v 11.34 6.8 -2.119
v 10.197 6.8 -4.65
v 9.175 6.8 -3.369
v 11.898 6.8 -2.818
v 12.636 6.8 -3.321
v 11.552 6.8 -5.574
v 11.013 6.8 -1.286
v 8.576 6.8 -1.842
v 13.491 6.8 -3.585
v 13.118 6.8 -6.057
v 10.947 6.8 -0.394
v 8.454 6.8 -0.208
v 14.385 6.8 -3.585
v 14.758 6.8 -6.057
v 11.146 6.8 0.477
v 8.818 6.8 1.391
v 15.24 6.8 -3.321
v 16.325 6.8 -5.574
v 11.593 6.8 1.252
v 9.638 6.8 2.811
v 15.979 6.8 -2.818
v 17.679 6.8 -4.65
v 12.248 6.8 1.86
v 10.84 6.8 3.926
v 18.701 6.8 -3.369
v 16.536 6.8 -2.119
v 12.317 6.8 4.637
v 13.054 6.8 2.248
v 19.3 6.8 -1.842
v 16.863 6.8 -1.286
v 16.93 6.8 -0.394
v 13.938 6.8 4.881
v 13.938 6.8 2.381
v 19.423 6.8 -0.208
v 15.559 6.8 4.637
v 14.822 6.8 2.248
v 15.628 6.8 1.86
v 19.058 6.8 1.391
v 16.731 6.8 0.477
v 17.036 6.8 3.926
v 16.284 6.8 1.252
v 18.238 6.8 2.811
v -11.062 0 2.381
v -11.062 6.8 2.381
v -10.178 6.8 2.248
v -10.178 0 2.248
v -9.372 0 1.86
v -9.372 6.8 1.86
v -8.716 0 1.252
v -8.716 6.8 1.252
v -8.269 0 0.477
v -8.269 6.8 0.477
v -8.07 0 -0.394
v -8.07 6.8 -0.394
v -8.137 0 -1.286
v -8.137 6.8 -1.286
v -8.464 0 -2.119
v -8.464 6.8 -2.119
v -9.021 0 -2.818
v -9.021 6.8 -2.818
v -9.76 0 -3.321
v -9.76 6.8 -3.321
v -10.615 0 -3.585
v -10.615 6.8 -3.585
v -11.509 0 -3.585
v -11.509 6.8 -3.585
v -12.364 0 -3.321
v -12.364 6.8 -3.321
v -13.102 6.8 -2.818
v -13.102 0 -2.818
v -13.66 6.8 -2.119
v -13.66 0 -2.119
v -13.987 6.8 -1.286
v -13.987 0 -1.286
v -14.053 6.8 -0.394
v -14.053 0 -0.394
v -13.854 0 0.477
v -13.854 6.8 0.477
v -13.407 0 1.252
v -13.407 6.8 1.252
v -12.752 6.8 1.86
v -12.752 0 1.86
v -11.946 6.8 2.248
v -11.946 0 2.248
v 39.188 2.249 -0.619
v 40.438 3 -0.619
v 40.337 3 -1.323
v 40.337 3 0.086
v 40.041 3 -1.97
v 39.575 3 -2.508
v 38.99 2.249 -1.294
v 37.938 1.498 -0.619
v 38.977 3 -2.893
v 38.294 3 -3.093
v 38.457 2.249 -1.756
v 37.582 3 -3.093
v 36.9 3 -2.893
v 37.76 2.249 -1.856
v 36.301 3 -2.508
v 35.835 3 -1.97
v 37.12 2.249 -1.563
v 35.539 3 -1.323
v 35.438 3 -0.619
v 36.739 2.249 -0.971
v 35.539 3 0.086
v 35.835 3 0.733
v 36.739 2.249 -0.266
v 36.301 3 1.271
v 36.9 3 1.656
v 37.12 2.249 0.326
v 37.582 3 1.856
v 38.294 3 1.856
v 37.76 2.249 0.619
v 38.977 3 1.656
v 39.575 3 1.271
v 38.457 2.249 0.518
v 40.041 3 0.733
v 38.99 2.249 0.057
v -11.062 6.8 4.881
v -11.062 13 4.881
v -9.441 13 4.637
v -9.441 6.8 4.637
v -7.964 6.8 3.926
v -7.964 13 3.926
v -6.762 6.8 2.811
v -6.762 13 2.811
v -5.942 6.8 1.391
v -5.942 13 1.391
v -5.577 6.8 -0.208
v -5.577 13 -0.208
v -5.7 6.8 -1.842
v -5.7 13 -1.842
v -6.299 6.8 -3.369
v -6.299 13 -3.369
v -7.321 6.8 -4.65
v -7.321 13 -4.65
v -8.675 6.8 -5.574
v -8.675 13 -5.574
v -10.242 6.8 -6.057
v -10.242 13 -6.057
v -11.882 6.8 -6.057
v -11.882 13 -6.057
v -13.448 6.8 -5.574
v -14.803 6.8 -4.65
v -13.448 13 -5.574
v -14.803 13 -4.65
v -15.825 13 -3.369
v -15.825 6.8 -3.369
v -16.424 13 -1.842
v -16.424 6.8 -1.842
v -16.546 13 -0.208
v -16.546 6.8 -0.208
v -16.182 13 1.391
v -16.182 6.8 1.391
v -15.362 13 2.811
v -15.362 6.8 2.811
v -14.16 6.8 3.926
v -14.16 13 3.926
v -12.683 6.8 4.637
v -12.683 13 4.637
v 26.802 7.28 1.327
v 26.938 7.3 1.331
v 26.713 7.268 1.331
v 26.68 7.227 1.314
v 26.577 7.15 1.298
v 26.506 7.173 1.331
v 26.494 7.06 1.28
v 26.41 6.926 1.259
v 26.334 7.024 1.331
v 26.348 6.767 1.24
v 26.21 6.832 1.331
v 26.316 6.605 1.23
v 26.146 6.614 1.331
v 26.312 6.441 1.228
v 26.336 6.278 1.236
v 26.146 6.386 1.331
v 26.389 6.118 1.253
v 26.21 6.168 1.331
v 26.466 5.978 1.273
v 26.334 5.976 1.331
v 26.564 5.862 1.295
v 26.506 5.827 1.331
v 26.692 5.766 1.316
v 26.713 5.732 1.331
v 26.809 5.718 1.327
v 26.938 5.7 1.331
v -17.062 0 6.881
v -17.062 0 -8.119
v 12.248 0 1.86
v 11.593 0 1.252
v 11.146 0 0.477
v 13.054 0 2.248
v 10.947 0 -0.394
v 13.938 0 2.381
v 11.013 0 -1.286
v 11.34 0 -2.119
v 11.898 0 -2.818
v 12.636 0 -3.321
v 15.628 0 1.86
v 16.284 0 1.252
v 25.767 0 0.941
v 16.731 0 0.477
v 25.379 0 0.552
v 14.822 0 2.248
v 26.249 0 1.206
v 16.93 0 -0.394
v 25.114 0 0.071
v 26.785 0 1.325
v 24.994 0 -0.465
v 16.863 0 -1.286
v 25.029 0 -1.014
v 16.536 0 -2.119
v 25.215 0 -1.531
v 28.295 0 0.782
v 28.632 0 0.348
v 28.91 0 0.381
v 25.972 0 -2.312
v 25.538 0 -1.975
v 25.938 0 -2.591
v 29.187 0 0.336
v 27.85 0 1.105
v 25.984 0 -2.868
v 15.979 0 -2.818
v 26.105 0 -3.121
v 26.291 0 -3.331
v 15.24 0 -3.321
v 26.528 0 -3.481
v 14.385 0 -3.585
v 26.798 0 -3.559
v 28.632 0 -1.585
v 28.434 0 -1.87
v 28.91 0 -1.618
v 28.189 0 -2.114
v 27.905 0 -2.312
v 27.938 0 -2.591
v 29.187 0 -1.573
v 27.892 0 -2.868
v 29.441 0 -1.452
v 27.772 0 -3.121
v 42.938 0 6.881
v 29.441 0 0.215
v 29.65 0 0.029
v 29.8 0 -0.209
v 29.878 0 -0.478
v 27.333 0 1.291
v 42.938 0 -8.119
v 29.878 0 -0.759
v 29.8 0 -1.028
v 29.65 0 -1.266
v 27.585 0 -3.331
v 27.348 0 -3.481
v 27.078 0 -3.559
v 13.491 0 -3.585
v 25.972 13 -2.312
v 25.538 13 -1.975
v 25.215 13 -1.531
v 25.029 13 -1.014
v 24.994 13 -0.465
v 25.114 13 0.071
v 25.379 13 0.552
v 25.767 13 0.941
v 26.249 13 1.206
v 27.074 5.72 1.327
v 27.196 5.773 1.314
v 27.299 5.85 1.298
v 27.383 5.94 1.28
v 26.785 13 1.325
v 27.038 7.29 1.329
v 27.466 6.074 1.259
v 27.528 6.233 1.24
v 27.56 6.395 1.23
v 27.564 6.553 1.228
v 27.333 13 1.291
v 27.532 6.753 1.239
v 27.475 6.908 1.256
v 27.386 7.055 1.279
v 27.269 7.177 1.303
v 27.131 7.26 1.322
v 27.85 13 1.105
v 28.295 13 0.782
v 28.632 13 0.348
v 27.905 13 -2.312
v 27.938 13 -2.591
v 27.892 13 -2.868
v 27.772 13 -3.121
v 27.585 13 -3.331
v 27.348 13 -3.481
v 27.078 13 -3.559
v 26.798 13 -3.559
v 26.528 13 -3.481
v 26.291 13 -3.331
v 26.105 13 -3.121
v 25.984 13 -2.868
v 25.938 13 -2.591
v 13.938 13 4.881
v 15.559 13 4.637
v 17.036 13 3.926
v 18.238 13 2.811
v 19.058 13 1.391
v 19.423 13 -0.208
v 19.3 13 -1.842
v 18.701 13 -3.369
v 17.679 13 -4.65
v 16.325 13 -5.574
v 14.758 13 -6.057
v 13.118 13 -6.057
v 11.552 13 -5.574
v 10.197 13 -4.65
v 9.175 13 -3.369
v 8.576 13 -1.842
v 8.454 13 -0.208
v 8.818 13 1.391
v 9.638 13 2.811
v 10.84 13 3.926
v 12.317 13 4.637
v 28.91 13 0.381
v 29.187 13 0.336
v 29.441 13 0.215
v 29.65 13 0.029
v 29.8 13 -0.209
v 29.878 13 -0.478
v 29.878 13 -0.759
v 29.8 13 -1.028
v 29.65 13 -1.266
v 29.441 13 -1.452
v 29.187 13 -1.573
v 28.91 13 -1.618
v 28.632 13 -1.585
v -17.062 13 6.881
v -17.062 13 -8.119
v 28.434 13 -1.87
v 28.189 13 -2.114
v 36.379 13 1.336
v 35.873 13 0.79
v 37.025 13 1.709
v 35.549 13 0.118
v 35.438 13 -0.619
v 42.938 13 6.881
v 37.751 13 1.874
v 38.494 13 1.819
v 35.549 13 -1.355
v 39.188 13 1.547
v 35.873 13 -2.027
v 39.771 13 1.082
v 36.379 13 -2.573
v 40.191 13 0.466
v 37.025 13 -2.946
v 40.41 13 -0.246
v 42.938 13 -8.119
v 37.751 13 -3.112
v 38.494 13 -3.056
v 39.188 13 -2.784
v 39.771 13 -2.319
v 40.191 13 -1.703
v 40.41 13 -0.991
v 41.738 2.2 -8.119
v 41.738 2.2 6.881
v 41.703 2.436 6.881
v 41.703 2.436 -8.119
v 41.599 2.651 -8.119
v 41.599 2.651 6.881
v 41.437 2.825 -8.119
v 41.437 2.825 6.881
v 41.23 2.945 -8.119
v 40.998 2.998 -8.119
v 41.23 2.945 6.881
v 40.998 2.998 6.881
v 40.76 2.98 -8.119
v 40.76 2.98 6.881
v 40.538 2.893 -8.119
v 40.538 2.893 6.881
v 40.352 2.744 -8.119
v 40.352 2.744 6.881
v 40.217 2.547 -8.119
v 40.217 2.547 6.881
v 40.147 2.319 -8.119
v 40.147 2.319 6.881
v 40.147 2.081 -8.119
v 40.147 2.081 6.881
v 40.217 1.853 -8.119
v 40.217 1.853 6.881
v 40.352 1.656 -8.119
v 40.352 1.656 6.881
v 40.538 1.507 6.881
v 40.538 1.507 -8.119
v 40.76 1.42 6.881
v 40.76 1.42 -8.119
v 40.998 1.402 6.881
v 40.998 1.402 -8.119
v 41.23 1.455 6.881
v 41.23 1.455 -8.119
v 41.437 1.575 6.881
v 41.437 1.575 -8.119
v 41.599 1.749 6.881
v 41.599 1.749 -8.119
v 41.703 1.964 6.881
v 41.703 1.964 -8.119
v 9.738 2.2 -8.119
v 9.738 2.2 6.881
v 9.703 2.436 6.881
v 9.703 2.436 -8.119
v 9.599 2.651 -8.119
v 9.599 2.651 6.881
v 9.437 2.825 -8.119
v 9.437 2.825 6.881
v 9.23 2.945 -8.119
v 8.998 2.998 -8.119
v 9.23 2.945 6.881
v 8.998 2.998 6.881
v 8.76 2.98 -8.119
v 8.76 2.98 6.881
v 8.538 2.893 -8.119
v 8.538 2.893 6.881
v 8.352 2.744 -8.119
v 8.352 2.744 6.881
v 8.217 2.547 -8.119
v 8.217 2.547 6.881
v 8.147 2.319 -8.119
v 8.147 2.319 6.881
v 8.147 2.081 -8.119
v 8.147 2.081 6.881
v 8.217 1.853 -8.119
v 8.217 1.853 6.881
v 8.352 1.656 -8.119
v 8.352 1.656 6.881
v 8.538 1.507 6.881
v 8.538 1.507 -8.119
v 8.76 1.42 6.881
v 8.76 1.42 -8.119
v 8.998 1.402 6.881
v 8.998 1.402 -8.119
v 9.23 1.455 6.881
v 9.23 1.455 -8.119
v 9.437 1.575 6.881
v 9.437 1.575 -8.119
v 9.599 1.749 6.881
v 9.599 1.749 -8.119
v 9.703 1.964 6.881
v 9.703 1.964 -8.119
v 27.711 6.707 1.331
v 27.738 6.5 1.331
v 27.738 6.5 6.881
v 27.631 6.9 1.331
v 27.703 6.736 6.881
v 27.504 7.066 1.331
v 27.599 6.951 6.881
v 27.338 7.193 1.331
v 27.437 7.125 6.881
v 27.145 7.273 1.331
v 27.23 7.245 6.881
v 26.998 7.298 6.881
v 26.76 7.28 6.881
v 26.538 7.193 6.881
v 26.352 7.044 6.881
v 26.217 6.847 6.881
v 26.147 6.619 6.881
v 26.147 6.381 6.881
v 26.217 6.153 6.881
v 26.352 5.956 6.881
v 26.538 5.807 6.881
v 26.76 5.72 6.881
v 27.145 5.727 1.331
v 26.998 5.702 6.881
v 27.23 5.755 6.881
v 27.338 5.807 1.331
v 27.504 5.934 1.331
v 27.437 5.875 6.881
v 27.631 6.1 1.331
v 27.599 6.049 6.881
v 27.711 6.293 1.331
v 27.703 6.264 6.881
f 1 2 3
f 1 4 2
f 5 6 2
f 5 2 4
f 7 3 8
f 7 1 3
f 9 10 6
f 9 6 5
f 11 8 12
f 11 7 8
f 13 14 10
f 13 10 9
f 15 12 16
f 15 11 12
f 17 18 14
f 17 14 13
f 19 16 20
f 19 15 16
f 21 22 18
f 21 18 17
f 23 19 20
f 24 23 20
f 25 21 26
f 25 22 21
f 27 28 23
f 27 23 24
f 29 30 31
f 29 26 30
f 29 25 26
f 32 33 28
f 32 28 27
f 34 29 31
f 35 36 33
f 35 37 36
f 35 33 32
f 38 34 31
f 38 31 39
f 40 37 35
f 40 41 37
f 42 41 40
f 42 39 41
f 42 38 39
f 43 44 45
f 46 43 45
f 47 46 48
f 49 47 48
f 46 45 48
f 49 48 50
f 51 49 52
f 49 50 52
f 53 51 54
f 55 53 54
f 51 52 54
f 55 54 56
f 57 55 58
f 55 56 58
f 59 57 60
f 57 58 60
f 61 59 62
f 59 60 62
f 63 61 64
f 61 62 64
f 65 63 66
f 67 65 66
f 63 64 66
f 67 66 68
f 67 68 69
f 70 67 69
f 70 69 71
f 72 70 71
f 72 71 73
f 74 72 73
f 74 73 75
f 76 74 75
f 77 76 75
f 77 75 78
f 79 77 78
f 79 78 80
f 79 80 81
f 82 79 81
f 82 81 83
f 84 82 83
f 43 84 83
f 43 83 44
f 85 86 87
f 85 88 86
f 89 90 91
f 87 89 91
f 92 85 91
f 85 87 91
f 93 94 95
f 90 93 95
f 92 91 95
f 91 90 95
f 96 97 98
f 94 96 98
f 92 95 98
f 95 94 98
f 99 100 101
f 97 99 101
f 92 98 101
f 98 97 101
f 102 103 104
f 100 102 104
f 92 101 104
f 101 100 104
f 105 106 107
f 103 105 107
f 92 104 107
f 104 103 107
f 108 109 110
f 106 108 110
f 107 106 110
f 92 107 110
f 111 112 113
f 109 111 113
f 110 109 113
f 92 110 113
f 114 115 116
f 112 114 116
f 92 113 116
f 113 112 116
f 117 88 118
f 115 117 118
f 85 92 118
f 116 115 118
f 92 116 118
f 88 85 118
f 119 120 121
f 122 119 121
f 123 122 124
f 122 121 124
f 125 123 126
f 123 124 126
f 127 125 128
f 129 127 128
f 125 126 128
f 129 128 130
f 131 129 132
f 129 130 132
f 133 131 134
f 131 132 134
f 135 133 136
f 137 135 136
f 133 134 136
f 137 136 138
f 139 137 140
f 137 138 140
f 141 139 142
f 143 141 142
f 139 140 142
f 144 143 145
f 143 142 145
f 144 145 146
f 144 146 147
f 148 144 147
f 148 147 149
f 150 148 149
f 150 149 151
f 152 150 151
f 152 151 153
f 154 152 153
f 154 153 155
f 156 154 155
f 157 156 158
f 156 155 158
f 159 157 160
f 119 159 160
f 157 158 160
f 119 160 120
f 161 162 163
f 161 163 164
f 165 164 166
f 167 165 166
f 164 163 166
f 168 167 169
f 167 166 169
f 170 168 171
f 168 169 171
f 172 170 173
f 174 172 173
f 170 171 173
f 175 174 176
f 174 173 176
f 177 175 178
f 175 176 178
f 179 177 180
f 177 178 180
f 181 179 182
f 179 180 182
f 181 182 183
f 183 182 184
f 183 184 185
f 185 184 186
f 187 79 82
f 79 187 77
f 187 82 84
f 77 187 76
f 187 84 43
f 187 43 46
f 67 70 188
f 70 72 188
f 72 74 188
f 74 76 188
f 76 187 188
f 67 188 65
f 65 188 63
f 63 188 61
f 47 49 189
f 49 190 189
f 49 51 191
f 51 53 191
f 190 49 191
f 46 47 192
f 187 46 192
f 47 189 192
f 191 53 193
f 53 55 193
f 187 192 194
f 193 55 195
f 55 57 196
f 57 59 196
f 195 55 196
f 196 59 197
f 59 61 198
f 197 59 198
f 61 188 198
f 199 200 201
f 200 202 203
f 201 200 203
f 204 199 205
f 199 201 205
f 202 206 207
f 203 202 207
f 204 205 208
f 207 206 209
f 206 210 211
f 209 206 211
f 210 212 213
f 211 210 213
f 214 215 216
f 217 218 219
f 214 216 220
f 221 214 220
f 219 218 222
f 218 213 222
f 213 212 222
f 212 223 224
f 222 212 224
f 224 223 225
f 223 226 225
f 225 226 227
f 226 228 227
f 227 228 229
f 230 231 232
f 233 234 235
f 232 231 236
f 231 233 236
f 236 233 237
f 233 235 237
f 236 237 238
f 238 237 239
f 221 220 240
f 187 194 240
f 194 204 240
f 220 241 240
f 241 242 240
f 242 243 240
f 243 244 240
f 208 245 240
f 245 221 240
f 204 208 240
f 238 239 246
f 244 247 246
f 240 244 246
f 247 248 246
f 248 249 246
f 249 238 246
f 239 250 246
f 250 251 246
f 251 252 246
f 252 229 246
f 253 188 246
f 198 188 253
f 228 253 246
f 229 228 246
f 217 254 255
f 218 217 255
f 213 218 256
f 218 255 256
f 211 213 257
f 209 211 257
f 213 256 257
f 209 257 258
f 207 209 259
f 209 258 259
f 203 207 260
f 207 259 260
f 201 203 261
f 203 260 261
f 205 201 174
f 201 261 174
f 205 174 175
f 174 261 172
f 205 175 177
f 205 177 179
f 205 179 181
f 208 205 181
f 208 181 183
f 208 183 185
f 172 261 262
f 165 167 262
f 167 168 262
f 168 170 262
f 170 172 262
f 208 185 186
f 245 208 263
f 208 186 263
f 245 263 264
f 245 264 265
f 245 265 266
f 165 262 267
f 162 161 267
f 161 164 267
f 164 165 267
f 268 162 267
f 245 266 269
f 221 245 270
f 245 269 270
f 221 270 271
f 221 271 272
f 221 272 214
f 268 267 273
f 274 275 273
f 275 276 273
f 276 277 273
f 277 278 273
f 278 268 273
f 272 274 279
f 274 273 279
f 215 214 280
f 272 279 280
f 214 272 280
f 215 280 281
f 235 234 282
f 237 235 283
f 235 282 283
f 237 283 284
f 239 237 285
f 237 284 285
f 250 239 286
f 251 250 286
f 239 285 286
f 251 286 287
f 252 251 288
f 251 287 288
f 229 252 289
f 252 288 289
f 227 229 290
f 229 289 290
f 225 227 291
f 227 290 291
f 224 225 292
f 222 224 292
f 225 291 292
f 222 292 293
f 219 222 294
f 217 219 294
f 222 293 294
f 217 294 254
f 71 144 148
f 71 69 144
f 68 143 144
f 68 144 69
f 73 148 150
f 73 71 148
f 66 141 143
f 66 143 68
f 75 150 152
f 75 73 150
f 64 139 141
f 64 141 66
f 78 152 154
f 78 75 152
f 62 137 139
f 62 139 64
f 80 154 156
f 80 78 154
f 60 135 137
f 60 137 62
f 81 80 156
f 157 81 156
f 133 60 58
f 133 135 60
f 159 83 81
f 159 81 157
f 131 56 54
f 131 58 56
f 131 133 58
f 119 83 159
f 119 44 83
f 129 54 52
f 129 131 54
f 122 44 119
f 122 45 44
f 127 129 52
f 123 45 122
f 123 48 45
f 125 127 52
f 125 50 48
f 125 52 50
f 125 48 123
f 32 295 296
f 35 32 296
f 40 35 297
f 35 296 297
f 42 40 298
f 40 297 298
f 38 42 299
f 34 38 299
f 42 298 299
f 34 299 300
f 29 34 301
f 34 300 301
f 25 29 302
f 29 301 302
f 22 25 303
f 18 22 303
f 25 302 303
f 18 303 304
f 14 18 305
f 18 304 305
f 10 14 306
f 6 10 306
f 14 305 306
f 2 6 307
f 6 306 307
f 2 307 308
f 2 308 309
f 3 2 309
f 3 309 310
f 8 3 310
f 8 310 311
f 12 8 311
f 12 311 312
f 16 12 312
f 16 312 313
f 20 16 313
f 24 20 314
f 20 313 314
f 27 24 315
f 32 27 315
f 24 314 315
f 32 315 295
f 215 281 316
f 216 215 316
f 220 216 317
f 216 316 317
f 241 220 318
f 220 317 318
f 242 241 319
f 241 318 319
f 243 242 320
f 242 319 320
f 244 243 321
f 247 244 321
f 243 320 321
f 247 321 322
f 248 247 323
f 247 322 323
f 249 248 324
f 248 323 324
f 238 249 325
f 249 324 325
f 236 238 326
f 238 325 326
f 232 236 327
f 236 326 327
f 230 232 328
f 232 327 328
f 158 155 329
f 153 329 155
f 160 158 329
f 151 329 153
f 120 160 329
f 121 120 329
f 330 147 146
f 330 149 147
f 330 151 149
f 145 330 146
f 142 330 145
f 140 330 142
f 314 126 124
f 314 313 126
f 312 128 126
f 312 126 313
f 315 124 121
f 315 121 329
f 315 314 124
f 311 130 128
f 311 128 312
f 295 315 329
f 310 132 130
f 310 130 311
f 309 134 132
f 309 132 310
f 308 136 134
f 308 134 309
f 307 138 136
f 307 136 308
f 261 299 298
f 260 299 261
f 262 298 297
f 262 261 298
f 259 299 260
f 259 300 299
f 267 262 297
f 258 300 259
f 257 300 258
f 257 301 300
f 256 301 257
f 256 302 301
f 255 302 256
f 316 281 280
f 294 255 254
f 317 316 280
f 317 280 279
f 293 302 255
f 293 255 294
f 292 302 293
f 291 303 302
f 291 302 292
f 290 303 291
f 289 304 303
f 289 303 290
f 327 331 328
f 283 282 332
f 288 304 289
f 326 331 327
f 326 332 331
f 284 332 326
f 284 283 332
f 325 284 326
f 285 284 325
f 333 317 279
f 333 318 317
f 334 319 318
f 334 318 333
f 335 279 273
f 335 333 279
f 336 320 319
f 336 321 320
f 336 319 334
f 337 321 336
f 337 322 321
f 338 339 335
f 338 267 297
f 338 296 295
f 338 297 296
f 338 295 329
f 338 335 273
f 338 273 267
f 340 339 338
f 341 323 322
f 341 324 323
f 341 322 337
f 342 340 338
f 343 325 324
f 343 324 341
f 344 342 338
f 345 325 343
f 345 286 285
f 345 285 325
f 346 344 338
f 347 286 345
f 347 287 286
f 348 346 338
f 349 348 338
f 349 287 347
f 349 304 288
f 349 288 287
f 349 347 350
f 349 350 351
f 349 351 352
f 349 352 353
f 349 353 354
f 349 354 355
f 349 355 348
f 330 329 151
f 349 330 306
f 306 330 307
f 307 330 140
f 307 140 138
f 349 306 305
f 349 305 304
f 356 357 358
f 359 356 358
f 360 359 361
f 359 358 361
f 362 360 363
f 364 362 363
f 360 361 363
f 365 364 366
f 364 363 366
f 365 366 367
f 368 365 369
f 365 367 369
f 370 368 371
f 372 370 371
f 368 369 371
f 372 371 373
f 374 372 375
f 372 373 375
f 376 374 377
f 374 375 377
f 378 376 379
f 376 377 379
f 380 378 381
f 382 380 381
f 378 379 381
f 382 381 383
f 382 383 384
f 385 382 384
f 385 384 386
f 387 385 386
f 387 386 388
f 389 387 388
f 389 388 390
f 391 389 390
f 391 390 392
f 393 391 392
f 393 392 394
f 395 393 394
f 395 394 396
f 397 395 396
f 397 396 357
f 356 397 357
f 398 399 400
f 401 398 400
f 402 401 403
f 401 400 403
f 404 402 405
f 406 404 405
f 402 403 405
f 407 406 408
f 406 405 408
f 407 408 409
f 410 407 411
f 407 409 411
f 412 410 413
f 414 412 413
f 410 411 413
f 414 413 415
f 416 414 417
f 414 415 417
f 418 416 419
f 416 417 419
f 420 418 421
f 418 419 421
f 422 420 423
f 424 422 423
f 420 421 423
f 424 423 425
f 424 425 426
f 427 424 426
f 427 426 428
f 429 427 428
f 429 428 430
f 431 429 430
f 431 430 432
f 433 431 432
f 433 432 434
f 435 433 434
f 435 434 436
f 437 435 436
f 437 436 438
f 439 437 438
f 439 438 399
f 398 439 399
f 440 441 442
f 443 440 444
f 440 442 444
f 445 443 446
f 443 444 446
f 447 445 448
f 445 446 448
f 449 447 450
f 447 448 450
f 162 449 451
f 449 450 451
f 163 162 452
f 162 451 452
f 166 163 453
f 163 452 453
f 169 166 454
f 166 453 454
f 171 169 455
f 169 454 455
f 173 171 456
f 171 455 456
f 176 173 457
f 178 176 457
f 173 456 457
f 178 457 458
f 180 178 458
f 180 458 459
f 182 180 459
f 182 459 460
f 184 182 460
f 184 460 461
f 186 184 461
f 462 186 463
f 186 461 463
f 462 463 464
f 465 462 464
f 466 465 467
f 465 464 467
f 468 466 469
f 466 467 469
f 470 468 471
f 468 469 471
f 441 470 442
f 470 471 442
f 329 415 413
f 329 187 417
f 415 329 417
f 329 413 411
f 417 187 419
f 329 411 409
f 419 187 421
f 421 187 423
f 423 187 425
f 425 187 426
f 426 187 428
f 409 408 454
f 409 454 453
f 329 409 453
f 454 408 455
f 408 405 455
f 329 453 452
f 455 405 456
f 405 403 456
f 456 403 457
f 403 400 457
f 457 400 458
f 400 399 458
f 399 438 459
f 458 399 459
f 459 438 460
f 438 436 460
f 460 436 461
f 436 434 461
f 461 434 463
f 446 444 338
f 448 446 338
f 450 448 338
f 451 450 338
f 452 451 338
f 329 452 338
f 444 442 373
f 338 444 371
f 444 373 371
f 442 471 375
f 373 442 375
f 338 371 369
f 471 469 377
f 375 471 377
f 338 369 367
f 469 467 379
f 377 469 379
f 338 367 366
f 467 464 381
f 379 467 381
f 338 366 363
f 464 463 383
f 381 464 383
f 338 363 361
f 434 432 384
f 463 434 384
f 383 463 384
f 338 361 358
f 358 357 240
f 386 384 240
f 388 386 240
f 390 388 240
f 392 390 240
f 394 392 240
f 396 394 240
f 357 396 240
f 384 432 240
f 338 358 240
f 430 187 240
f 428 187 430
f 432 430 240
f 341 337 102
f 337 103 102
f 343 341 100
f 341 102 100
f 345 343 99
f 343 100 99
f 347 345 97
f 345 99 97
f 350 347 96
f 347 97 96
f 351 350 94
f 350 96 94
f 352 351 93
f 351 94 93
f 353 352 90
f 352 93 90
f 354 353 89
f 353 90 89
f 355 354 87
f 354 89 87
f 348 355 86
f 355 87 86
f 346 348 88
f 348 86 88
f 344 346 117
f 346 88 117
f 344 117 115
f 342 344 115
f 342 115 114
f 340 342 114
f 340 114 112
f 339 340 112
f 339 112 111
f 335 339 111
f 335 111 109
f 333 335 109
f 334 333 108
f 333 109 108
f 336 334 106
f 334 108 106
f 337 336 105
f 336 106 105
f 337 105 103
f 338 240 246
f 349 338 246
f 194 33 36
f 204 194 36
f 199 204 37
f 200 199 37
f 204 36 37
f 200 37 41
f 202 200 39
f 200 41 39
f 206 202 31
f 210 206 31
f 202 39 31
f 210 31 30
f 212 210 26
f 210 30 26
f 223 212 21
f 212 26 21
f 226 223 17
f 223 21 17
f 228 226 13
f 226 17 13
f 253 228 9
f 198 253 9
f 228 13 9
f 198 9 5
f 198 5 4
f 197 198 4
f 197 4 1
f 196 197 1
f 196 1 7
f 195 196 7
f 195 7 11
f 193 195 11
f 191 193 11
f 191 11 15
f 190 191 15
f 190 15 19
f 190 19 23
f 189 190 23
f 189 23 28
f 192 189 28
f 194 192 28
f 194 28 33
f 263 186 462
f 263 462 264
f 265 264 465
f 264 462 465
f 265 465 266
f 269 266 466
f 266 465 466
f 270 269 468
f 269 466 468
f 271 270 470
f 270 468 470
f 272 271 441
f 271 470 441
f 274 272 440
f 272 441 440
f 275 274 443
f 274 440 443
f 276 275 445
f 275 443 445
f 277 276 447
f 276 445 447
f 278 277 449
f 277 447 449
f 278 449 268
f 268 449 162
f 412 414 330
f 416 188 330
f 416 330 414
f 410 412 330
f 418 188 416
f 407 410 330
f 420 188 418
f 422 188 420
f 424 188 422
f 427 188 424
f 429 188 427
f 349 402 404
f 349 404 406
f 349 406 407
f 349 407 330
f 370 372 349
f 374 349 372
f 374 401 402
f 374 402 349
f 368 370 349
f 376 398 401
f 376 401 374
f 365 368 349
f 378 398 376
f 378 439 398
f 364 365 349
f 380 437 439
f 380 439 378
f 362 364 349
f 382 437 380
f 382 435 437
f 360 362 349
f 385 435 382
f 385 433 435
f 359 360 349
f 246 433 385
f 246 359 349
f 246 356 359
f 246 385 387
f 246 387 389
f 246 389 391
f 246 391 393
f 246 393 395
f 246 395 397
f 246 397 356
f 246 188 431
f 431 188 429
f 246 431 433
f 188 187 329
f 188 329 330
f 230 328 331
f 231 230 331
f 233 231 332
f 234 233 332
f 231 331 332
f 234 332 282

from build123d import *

# Parameters (mm, degrees)
SKETCH1_W                 = 60
SKETCH1_H                 = 15
BOSS_EXTRUDE1_DEPTH       = 13
M2X0_4_TAPPED_HOLE1_D     = 1.6
CUT_EXTRUDE1_DEPTH        = 46.591613279
M6X1_0_TAPPED_HOLE1_D     = 5
M6X1_0_TAPPED_HOLE1_DEPTH = 10
M6X1_0_TAPPED_HOLE1_TIP   = 1.502151548
SKETCH15_R                = 3
CUT_EXTRUDE2_DEPTH        = 46.591613308
SKETCH16_R                = 5.5
CUT_EXTRUDE3_DEPTH        = 6.2


# Read off the part's stored shape, not the designer's step: M2x0.4 Tapped Hole2
with BuildPart() as part:
    # Sketch1 → Boss-Extrude1 (new body)
    with BuildSketch(Plane(origin=(0, 0, 0), x_dir=(1, 0, 0), z_dir=(0, 1, 0))):
        with Locations((12.93814433, 0.618556701)):
            Rectangle(SKETCH1_W, SKETCH1_H)
    extrude(amount=BOSS_EXTRUDE1_DEPTH)

    # M2x0.4 Tapped Hole1 (through all)
    with Locations(Plane(origin=(0, 0, -8.118556701), x_dir=(-1, 0, 0), z_dir=(0, 0, -1))):
        with Locations((-40.93814433, 2.2), (-8.93814433, 2.2)):
            Hole(M2X0_4_TAPPED_HOLE1_D / 2)

    # Sketch5 → Cut-Extrude1 (cut, through all)
    with BuildSketch(Plane(origin=(0, 13, 0), x_dir=(1, 0, 0), z_dir=(0, 1, 0))):
        with BuildLine():
            ThreePointArc((28.631734073, 1.585124743), (28.317002553, 1.997414924), (27.904712372, 2.312146445))
            ThreePointArc((27.904712372, 2.312146445), (26.93814433, 3.568556701), (25.971576288, 2.312146445))
            ThreePointArc((25.971576288, 2.312146445), (25.559286107, -0.760301522), (28.631734073, -0.348011341))
            ThreePointArc((28.631734073, -0.348011341), (29.88814433, 0.618556701), (28.631734073, 1.585124743))
        make_face()
    extrude(amount=-CUT_EXTRUDE1_DEPTH, mode=Mode.SUBTRACT)

    # M2x0.4 Tapped Hole2 outline → M2x0.4 Tapped Hole2 (revolve, cut)
    with BuildSketch(Plane(origin=(26.93814433, 6.5, 0), x_dir=(1, 0, 0), z_dir=(0, -1, 0))):
        Polygon((0, 1.227710243), (0.627359351, 1.227710243), (0.8, 1.331443299), (0.8, 6.881443299), (0, 6.881443299), align=None)
    revolve(axis=Axis((26.93814433, 6.5, 0), (0, 0, 1)), mode=Mode.SUBTRACT)

    # M6x1.0 Tapped Hole1
    with Locations(Plane(origin=(0, 13, 0), x_dir=(1, 0, 0), z_dir=(0, 1, 0))):
        with Locations((37.93814433, 0.618556701)):
            Hole(M6X1_0_TAPPED_HOLE1_D / 2, depth=M6X1_0_TAPPED_HOLE1_DEPTH)
            with Locations((0, 0, -(M6X1_0_TAPPED_HOLE1_DEPTH + M6X1_0_TAPPED_HOLE1_TIP / 2))):  # 118° drill point
                Cone(0, M6X1_0_TAPPED_HOLE1_D / 2, M6X1_0_TAPPED_HOLE1_TIP, mode=Mode.SUBTRACT)

    # Sketch15 → Cut-Extrude2 (cut, through all)
    with BuildSketch(Plane(origin=(0, 13, 0), x_dir=(1, 0, 0), z_dir=(0, 1, 0))):
        with Locations(Location((-11.06185567, 0.618556701, 0), (0, 0, 270))):
            Circle(SKETCH15_R)
        with Locations(Location((13.93814433, 0.618556701, 0), (0, 0, 270))):
            Circle(SKETCH15_R)
    extrude(amount=-CUT_EXTRUDE2_DEPTH, mode=Mode.SUBTRACT)

    # Sketch16 → Cut-Extrude3 (cut)
    with BuildSketch(Plane(origin=(0, 13, 0), x_dir=(1, 0, 0), z_dir=(0, 1, 0))):
        with Locations(Location((-11.06185567, 0.618556701, 0), (0, 0, 270))):
            Circle(SKETCH16_R)
        with Locations(Location((13.93814433, 0.618556701, 0), (0, 0, 270))):
            Circle(SKETCH16_R)
    extrude(amount=-CUT_EXTRUDE3_DEPTH, mode=Mode.SUBTRACT)


solid = part.part
